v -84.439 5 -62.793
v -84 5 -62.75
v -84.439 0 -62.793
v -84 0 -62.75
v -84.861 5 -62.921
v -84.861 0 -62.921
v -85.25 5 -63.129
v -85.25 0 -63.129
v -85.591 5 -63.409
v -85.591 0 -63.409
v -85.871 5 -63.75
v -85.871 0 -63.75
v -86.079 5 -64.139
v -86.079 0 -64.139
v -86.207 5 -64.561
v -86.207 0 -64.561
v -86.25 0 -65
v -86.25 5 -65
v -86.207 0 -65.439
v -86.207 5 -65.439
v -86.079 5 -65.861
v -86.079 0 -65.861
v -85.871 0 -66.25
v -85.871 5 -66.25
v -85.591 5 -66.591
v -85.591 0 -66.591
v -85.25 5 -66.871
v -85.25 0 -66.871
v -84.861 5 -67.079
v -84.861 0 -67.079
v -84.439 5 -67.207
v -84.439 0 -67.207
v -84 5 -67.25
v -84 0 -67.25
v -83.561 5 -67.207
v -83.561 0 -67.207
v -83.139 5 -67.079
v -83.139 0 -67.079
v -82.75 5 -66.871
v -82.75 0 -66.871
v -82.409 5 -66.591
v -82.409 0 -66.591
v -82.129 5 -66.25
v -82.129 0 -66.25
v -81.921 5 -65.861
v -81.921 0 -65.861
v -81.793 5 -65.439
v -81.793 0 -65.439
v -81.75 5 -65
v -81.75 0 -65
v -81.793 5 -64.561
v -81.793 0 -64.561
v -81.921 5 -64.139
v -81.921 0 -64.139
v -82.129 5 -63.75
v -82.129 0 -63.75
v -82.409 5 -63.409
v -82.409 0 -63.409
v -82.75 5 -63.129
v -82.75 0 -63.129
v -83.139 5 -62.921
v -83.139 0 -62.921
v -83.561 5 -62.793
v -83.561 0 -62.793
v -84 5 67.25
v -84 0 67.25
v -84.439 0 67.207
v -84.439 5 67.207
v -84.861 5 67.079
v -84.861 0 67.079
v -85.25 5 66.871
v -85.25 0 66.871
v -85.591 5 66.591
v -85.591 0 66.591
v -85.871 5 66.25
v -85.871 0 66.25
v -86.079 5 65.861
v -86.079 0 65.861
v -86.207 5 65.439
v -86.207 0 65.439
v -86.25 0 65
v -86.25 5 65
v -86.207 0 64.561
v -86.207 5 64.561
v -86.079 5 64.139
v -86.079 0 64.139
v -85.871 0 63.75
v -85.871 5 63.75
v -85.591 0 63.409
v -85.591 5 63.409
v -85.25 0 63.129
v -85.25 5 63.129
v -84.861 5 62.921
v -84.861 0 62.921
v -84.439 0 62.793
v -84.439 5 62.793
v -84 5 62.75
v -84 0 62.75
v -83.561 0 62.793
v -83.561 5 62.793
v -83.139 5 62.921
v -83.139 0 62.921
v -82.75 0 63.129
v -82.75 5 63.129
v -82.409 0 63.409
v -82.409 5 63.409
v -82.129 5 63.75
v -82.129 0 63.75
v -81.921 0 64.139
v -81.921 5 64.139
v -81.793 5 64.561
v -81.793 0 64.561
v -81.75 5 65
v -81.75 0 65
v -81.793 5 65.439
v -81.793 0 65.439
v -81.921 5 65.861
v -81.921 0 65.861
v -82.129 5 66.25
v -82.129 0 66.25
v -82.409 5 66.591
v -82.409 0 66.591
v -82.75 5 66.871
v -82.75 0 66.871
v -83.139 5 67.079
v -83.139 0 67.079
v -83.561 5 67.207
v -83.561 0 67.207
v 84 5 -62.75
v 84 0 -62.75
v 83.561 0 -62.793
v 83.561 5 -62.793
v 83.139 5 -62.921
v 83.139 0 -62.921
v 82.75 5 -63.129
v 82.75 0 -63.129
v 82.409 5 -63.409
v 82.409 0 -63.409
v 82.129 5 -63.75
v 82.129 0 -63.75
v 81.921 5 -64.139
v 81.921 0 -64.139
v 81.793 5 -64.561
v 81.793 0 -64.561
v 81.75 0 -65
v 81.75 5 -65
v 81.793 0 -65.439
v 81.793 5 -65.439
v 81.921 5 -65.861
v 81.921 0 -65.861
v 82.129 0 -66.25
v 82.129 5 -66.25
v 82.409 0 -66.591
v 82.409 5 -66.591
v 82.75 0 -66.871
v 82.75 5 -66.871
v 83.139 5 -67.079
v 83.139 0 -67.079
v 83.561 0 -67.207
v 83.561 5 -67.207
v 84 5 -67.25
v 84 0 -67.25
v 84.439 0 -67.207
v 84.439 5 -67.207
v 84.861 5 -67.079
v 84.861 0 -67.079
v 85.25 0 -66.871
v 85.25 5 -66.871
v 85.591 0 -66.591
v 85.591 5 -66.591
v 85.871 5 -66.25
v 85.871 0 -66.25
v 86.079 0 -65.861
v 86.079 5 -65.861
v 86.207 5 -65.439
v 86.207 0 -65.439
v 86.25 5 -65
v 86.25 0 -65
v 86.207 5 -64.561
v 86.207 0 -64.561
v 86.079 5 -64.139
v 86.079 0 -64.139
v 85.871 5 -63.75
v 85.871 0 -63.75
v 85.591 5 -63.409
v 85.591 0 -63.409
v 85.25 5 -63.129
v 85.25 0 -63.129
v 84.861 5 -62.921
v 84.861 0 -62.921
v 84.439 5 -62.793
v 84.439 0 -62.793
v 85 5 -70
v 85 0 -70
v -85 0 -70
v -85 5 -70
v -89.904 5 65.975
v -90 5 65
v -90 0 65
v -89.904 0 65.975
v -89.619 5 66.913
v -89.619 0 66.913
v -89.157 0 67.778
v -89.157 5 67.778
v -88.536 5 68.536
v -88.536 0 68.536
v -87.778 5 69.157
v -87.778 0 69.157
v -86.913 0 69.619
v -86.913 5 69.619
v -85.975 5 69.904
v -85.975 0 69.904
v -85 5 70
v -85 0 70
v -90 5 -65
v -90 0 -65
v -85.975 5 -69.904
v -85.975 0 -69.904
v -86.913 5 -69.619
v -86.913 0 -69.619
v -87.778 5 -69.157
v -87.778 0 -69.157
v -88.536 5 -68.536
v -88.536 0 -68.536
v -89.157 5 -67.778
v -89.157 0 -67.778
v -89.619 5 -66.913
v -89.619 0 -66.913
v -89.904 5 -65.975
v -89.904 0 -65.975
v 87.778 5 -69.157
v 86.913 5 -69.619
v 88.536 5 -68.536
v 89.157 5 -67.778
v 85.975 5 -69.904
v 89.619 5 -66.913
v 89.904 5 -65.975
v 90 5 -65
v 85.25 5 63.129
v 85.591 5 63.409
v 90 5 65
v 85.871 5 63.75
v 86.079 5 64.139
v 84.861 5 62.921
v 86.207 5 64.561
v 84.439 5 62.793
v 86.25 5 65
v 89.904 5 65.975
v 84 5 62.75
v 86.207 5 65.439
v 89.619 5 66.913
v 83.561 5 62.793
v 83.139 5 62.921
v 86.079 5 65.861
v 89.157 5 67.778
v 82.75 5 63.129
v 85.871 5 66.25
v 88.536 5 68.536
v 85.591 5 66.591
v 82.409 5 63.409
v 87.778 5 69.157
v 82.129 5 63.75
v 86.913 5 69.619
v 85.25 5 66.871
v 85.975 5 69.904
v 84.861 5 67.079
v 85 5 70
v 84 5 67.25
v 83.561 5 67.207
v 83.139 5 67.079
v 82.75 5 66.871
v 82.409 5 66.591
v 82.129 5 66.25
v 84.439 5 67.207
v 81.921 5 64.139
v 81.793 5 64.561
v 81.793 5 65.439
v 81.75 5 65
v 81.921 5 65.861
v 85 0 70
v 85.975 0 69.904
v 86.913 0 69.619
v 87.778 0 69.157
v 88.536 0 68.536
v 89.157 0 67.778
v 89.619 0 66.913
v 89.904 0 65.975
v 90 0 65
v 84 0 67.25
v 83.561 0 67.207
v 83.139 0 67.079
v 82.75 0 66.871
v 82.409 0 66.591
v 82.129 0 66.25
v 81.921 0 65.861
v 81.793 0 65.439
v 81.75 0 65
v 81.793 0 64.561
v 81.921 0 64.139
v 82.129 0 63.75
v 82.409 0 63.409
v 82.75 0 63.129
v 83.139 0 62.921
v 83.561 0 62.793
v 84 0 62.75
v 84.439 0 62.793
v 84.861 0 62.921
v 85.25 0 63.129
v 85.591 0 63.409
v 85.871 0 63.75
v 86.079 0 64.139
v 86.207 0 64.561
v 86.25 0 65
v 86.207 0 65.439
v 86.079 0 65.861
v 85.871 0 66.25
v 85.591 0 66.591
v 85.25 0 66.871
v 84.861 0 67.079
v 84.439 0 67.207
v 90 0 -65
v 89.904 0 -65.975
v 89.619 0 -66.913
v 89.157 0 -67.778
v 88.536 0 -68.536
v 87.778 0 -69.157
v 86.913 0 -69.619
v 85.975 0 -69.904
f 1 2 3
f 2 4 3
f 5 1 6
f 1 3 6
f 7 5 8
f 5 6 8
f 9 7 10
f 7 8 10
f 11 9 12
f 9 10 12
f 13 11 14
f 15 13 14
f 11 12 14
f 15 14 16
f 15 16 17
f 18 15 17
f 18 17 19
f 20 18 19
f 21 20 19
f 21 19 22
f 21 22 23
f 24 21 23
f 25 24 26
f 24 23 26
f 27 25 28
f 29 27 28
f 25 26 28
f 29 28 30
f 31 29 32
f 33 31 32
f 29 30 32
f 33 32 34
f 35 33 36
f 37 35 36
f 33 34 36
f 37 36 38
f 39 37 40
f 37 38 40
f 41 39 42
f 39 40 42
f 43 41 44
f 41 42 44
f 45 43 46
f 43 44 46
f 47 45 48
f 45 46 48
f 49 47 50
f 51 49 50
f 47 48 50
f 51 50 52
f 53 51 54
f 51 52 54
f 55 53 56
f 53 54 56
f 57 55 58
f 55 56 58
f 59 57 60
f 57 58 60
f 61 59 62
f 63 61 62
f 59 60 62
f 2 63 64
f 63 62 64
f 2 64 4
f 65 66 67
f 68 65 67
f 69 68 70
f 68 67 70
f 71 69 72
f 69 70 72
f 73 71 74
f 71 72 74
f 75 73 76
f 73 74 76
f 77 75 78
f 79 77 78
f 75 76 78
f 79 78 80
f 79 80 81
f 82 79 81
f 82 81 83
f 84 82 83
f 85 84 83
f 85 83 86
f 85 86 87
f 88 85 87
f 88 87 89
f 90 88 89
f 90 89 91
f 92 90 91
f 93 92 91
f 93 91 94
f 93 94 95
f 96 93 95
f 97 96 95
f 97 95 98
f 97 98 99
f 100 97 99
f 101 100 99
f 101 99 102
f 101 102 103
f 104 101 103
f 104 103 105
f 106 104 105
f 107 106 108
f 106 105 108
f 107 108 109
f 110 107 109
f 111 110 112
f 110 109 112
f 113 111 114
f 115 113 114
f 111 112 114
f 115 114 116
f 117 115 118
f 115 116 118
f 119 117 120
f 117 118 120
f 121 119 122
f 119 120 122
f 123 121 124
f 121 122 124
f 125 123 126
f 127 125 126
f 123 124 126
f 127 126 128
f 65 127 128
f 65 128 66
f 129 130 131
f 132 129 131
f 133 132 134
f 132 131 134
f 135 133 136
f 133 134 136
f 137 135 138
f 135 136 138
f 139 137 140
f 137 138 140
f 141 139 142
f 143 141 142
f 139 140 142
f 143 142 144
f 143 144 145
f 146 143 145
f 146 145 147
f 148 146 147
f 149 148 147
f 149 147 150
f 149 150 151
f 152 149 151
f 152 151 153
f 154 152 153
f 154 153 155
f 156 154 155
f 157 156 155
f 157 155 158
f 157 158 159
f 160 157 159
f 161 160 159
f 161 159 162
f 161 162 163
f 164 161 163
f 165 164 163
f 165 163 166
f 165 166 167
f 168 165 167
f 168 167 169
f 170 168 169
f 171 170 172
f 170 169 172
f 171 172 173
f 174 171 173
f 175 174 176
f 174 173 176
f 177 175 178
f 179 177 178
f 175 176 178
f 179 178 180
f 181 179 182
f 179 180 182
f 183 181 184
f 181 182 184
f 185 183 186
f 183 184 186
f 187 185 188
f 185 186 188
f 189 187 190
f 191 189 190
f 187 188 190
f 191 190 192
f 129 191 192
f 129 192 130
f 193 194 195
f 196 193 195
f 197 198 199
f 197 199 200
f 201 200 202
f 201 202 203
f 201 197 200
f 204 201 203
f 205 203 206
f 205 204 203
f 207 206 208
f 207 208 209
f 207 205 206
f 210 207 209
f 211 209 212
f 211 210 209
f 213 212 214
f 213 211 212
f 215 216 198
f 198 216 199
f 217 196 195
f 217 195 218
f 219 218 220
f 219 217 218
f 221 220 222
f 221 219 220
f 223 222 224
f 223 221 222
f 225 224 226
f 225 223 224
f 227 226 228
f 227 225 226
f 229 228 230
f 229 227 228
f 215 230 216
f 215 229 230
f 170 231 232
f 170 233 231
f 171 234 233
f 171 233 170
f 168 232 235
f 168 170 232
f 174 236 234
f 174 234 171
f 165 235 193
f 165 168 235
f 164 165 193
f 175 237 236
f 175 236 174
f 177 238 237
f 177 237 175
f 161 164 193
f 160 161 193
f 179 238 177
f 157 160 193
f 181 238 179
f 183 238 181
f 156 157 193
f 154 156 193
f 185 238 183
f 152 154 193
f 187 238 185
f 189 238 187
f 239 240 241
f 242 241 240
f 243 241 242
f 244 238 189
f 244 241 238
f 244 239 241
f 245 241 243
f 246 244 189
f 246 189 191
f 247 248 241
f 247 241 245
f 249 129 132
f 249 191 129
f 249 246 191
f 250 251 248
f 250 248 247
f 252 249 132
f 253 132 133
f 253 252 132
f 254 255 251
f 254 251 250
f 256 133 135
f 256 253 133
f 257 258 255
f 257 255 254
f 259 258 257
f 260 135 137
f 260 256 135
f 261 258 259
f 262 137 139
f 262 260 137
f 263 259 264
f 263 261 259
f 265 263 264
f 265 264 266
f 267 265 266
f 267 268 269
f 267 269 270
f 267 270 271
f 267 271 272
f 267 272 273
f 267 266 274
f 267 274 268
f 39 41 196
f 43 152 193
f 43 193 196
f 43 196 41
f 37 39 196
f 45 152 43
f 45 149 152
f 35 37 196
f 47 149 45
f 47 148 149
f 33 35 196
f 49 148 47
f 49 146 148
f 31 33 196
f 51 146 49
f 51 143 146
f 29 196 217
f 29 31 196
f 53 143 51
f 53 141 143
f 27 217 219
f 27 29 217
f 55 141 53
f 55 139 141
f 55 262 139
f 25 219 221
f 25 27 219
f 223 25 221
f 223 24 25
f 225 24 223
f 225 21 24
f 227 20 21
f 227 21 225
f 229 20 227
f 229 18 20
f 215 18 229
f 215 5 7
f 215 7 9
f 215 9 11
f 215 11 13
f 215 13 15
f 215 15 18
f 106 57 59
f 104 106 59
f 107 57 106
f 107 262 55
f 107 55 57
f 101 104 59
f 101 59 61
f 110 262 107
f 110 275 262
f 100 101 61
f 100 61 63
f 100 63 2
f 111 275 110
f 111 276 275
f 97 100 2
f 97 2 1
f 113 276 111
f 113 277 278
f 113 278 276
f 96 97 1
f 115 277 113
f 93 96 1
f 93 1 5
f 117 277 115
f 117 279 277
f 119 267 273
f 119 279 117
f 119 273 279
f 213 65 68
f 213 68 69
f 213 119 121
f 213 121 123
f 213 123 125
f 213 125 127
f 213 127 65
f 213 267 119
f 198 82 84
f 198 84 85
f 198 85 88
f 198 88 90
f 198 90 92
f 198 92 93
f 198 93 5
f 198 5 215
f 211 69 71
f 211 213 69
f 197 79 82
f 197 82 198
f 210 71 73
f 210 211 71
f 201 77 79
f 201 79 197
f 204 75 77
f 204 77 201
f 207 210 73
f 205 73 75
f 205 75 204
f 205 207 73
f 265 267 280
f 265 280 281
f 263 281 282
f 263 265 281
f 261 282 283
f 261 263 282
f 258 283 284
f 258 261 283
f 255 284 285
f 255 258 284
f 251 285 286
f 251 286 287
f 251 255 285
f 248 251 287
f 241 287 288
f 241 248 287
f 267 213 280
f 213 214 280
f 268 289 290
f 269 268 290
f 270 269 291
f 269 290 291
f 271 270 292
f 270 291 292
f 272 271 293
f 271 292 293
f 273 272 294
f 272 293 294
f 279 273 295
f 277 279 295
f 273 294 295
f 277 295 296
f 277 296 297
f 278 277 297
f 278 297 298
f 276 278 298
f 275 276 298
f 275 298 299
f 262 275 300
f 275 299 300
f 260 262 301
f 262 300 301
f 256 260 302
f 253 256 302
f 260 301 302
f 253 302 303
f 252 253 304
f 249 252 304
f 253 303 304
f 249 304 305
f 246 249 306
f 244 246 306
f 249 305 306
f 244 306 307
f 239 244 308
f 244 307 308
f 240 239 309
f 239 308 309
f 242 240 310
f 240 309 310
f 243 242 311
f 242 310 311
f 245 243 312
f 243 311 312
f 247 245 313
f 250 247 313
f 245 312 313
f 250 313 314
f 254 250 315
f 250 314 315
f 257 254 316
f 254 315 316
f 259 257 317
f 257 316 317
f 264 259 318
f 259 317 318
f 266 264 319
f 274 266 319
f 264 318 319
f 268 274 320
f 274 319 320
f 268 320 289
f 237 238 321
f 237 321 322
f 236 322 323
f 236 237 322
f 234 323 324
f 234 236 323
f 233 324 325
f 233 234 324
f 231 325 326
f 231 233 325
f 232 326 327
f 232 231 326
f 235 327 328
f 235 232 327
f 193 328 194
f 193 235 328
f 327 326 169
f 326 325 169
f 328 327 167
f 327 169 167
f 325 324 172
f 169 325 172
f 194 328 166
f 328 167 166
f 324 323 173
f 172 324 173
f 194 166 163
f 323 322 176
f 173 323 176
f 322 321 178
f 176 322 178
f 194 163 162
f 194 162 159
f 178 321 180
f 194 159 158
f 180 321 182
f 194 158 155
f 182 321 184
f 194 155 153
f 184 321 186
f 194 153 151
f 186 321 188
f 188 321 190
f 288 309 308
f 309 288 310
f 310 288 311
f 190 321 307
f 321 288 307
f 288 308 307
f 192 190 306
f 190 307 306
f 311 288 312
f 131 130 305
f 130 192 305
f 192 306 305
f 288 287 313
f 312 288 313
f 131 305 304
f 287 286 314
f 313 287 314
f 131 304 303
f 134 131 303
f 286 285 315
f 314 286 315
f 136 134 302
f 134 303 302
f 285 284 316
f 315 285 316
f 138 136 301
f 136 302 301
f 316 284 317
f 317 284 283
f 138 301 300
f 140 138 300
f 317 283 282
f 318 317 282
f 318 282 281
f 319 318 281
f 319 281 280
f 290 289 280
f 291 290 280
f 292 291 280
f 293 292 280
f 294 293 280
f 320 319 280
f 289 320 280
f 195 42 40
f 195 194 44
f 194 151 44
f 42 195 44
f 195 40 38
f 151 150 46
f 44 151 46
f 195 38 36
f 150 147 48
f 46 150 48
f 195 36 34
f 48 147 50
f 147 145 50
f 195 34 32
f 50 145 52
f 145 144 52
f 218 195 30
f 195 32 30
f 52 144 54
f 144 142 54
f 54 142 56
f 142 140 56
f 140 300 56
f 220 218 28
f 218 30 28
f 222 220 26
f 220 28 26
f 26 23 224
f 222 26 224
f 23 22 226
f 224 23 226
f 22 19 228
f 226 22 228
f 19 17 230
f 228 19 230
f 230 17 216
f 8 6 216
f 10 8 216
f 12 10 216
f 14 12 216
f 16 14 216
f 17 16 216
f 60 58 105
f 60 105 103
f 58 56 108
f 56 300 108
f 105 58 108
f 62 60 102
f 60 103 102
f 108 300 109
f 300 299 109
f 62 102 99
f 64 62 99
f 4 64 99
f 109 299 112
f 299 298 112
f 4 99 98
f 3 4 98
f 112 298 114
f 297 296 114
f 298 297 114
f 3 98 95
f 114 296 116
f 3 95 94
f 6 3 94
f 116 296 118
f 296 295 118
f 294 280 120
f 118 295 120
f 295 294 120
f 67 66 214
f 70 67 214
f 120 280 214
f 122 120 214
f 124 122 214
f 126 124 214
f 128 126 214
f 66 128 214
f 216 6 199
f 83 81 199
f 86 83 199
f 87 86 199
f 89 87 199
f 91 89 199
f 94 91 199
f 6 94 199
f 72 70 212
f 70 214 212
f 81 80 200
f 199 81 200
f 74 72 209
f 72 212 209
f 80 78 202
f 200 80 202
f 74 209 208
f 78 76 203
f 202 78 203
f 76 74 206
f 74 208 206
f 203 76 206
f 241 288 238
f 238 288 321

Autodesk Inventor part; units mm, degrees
ref_plane "YZ Plane" through (0, 0, 0) normal (1, 0, 0) x (0, 1, 0)
ref_plane "XZ Plane" through (0, 0, 0) normal (0, 1, 0) x (-1, 0, 0)
ref_plane "XY Plane" through (0, 0, 0) normal (0, 0, 1) x (1, 0, 0)
sketch "Эскиз1" plane through (0, 0, 0) normal (0, 1, 0) x (-1, 0, 0)
  line L0 (90, 70) -> (-90, 70)
  line L1 (-90, 70) -> (-90, -70)
  line L2 (-90, -70) -> (90, -70)
  line L3 (90, -70) -> (90, 70)
  line L4 (-126, 0) -> (126, 0) projected
  line L5 (0, -98) -> (0, 98) projected
  point P0 (0, 0)
  dimension "d1" = 180
  dimension "d2" = 140
extrude "Выдавливание1" add sketch "Эскиз1" along normal blind 5
fillet "Сопряжение1" radius 5 4 edges at (90, 2.5, -70) (90, 2.5, 70) (-90, 2.5, 70) (-90, 2.5, -70)
sketch "Эскиз2" plane through (0, 5, 0) normal (0, 1, 0) x (1, 0, 0)
  line L0 (0, 98) -> (0, -98) projected
  line L1 (-126, 0) -> (126, 0) projected
  line L2 (-90, 65) -> (-90, -65) projected
  line L3 (-85, -70) -> (85, -70) projected
  point P0 (0, 0)
  point P1 (-84, -65)
  point P2 (-84, 65)
  point P3 (84, -65)
  point P4 (84, 65)
  dimension "d15" = 130
  dimension "d18" = 168
  dimension "d21" = 6
  dimension "d22" = 5
hole "Отверстие1" at (-84, 5, 65) at (84, 5, 65) at (-84, 5, -65) at (84, 5, -65) direction (0, -1, 0) diameter 4.5 end through all
properties part number "крышка акб" material "Пластик АБС"
